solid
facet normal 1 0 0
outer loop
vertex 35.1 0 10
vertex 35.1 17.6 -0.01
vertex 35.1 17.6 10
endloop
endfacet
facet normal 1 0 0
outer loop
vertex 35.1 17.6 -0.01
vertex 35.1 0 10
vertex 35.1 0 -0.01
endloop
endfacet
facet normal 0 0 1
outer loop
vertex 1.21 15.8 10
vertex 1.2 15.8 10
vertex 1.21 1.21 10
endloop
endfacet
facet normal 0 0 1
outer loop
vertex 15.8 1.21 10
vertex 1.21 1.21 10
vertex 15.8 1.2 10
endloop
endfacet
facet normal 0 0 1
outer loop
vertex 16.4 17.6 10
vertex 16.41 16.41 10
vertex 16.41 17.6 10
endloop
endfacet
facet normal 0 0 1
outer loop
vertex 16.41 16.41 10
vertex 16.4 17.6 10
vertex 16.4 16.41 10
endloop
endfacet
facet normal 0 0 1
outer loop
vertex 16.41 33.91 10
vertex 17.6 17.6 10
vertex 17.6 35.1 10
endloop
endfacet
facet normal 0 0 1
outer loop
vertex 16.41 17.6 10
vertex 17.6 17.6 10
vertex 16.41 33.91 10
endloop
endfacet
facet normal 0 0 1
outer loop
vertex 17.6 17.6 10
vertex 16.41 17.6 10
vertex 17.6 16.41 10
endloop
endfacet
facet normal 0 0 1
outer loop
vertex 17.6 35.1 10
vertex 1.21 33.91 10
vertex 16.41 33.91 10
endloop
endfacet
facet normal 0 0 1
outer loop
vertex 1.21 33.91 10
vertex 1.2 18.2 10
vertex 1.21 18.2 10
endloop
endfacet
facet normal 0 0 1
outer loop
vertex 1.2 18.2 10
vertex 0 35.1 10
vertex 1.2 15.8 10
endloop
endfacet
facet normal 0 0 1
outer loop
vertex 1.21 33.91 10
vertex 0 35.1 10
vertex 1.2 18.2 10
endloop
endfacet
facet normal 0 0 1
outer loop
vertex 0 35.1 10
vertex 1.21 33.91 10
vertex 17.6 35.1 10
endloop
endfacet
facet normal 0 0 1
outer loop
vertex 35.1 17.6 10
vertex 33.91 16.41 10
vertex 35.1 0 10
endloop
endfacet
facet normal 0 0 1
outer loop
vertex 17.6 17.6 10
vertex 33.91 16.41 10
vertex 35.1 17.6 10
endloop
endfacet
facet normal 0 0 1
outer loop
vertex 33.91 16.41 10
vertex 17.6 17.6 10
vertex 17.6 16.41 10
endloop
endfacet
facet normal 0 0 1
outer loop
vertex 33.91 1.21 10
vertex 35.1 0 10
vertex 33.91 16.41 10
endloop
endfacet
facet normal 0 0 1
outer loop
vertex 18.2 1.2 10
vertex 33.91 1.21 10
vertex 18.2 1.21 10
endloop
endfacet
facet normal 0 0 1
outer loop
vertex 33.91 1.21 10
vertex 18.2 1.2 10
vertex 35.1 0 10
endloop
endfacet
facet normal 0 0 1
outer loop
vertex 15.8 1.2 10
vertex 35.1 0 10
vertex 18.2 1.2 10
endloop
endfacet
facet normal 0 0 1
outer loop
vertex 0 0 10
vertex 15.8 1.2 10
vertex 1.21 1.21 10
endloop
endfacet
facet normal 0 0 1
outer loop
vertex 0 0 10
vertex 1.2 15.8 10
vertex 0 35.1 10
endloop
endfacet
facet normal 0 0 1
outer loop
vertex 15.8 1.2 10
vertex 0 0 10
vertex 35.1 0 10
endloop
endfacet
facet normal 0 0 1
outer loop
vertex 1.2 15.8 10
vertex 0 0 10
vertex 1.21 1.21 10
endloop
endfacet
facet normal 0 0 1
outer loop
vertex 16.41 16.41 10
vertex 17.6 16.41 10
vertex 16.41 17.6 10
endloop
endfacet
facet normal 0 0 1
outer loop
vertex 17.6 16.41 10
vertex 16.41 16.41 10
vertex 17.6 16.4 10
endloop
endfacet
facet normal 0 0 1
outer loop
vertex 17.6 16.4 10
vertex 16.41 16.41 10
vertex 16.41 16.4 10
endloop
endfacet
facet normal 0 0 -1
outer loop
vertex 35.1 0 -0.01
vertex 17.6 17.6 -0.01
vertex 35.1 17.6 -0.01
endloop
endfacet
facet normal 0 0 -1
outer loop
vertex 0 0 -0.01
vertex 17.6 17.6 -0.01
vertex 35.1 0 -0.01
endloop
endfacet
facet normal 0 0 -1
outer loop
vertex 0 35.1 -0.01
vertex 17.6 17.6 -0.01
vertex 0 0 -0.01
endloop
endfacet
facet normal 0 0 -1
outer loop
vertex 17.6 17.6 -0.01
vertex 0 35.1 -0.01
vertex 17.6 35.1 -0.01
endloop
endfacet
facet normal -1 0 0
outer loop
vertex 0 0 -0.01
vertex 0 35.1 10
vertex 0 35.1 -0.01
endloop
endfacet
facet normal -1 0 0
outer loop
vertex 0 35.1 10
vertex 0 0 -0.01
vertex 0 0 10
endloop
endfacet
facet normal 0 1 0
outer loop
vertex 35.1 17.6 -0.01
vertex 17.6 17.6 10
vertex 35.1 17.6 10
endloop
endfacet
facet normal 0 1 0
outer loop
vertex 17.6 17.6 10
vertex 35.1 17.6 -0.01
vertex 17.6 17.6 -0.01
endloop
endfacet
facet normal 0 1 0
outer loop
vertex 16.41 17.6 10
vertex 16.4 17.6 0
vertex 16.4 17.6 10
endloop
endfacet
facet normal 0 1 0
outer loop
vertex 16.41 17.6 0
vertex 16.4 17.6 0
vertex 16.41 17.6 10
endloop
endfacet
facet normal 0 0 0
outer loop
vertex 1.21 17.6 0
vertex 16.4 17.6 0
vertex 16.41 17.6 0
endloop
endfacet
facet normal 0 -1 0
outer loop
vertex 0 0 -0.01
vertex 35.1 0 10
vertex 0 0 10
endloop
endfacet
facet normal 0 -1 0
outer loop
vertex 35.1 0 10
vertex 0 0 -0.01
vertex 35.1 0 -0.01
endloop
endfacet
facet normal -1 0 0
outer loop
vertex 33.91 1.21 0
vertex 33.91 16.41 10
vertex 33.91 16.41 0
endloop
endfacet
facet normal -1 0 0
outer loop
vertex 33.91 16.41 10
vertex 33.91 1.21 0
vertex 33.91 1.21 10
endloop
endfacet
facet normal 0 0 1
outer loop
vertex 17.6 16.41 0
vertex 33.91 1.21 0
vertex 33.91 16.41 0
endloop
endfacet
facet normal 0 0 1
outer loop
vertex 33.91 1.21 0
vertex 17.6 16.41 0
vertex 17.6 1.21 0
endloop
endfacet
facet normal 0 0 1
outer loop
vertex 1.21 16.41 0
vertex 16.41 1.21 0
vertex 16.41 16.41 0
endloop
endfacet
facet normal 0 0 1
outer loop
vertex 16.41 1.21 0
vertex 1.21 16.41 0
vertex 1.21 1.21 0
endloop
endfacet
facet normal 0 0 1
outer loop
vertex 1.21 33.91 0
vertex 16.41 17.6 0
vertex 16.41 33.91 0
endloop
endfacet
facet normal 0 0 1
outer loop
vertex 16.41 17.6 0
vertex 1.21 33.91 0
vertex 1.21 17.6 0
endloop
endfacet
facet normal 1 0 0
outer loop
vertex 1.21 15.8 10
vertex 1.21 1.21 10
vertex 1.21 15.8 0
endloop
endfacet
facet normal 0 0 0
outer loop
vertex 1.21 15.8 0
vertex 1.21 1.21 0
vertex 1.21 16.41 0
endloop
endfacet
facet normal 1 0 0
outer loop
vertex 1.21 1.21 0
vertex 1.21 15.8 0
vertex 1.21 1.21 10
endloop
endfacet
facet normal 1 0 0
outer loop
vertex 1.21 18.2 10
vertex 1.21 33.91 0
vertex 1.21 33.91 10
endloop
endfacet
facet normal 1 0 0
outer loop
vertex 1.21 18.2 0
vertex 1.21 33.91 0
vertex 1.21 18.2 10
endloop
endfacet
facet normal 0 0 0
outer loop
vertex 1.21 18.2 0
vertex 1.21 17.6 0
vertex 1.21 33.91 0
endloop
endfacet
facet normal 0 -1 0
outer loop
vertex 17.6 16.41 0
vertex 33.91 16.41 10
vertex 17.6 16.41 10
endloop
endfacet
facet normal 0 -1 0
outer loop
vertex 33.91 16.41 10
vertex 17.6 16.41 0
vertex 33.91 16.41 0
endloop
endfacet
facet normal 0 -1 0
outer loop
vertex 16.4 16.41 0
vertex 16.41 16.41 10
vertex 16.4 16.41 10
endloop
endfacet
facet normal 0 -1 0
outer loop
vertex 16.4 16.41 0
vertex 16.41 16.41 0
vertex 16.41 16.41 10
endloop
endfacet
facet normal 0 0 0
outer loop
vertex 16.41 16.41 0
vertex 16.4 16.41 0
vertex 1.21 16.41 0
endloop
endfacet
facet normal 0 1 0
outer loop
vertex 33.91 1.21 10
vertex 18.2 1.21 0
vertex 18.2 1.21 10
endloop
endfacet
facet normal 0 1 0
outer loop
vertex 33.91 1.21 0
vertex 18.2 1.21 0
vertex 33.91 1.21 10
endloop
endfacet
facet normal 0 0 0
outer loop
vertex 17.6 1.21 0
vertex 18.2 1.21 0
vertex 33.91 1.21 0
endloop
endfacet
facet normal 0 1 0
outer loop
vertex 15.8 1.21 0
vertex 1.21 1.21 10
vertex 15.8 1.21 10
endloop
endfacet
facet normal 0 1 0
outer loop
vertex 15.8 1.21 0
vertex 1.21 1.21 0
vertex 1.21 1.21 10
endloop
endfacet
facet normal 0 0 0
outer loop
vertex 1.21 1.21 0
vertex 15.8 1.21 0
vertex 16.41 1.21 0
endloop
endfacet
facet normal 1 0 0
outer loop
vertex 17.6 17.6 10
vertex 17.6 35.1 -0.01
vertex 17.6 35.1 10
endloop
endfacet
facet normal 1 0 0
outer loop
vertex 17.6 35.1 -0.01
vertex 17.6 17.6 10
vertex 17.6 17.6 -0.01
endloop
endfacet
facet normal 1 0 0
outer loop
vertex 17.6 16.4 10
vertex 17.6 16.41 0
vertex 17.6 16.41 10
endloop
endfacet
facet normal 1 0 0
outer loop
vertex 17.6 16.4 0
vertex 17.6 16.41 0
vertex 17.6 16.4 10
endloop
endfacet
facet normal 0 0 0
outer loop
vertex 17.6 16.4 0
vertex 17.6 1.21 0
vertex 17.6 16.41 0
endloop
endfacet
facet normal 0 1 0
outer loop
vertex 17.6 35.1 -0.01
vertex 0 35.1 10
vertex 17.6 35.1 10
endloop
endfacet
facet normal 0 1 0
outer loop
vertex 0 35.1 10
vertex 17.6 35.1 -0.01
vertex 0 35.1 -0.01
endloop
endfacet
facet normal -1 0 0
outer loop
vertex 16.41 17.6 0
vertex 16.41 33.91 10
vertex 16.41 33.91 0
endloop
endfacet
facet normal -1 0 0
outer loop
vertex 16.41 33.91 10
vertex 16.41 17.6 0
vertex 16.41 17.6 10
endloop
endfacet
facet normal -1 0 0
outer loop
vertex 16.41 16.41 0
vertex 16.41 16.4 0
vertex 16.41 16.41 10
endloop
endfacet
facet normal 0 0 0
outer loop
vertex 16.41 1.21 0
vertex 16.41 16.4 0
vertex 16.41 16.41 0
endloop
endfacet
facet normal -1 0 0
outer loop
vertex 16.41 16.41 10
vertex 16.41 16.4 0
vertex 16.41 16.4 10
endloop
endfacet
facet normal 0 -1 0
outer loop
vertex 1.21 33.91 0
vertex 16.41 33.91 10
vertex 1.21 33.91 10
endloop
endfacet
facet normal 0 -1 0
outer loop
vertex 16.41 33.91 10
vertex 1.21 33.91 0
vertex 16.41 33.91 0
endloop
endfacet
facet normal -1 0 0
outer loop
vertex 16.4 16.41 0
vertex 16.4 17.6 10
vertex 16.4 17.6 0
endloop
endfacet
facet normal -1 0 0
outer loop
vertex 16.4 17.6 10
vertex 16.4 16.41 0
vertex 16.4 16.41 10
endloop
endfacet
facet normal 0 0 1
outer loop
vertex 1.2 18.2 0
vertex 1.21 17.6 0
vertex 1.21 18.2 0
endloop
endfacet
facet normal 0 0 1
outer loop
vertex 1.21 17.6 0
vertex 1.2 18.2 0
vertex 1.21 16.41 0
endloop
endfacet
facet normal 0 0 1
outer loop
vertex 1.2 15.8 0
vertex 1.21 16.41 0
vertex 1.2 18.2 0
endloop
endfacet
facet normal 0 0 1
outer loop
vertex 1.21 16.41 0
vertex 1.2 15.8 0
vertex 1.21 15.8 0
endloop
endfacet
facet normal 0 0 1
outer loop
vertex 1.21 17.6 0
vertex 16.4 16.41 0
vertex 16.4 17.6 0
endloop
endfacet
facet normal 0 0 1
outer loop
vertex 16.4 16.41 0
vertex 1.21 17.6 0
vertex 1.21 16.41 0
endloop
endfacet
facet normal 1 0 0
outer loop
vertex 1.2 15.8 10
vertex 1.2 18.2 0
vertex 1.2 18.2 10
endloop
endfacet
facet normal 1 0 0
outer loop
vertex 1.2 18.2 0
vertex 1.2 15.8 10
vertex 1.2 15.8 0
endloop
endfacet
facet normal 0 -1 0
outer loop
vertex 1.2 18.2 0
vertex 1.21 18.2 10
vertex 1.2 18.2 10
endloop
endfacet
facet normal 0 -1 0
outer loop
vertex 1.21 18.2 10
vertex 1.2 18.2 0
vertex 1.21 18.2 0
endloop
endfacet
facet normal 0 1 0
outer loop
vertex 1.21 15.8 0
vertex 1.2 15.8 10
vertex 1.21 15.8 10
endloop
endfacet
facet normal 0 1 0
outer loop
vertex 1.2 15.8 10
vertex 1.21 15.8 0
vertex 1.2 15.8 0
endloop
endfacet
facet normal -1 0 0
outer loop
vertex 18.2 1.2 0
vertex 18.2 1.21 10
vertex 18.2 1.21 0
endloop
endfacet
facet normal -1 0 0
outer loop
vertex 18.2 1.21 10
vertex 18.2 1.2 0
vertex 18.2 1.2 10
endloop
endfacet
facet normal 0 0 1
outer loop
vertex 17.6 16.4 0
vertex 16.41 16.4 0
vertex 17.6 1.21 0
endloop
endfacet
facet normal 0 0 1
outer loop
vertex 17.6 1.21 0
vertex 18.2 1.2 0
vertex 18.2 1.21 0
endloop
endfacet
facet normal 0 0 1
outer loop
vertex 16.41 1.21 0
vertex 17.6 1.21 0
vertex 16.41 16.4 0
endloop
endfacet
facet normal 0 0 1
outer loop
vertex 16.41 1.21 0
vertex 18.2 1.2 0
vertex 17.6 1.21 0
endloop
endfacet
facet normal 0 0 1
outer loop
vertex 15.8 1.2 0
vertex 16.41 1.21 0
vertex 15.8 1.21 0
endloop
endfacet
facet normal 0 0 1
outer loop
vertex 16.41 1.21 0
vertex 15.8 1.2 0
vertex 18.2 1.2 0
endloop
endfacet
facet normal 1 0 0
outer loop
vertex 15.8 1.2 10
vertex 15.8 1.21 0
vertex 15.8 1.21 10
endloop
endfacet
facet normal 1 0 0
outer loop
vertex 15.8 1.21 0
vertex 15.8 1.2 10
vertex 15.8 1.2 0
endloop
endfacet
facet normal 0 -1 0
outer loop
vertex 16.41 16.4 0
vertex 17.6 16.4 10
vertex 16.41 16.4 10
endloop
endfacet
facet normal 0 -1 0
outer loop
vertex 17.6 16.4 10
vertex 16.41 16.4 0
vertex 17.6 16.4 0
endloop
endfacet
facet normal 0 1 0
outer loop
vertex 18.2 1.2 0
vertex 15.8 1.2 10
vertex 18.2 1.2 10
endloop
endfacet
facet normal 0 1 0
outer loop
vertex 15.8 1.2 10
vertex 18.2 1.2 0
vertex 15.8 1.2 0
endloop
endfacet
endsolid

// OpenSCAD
// file: ../Base/Rotation.scad
// Fischertechnik Box Foundation
// Geometry Helpers Rotation

include <PlacementOptions.scad>

// getRotatedSpace(space, rotation=NoRotation)
// Rotates the space dependent on the specified rotation

function getRotatedSpace(space, rotation=NoRotation) = [
    (rotation == Rotate90 || rotation == Rotate270) ? space.y : space.x,
    (rotation == Rotate90 || rotation == Rotate270) ? space.x : space.y
];

// Rotates the given space around the fixed left lower corner
// space = the space the children needs as width/depth list [width,depth]
// rotation = 0 Rotate0 degrees, 1 Rotate90 degrees, 2 Rotate180 degrees, 3 Rotate270 degrees (equivalent to -90)

module RotateFix(space, rotation=NoRotation) {
    dy = (rotation == Rotate0 || rotation == Rotate270) ? 0 :
        (rotation == Rotate90) ? space.x :
        space.y;
    dx = (rotation < Rotate180) ? 0 :
        (rotation == Rotate180) ? space.x :
        space.y;
    
    translate([dx, dy, 0])
        rotate([0, 0, rotations[rotation]])
            children();
}
// file: ../Base/Alignment.scad
// Fischertechnik Box Foundation
// Geometry Helpers Alignment

include <PlacementOptions.scad>

// getAlignedX(elementWidth, spaceWidth, align=AlignRight, offset=0)
// Gets the aligned X offset of an element with the given
// width in the given space.
// elementWidth = The width of the element to positon
// spaceWidth = The space where the element should be aligned
// align = 0 AlignLeft, 1 AlignCenter, 2 AlignRight
// offset = an optional offset from the aligned position. When
// aligned left or centered, then positive values are in X direction.
// When aligned right then positive values are in negative X direction.

function getAlignedX(elementWidth, spaceWidth, align=AlignRight, offset=0) =
    (align == AlignLeft) ?
        offset :
        ((align == AlignCenter) ?
        (spaceWidth - elementWidth)/2 + offset :
        spaceWidth - offset - elementWidth);

// getAlignedY(elementDepth, spaceDepth, align=AlignTop, offset=0)
// Gets the aligned Y offset of an element with the given
// depth in the given space.
// elementDepth = The depth of the element to positon
// spaceDepth = The space where the element should be aligned
// align = 0 AlignBottom, 1 AlignCenter, 2 AlignTop
// offset = an optional offset from the aligned position. When
// aligned bottom or centered, then positive values are in Y direction.
// When aligned top then positive values are in negative Y direction.

function getAlignedY(elementDepth, spaceDepth, align=AlignTop, offset=0) =
    (align == AlignBottom) ?
        offset :
        ((align == AlignCenter) ?
        (spaceDepth - elementDepth)/2 + offset :
        spaceDepth - offset - elementDepth);
// file: ../Base/PlacementOptions.scad
// Fischertechnik Box Foundation
// Placement Options

// Alignment
NoAlign = 0;
AlignLeft = 1;
AlignBottom = 2;
AlignCenter = 3;
AlignRight = 4;
AlignTop = 5;

// Element rotation degree steps
rotations = [0, -90, -180, -270];

// Rotation
NoRotation = 0;
Rotate0 = 0;
Rotate90 = 1;
Rotate180 = 2;
Rotate270 = 3;

// Docking (seen from above)
NoDock = -1;
DockLeft = 0;
DockTop = 1;
DockRight = 2;
DockCorner = 2;
DockBottom = 3;

// Web corners
LowerLeft = 0;
UpperLeft = 1;
UpperRight = 2;
LowerRight = 3;

// Web position relative to corner
LeftOfCorner = 0;
RightOfCorner = 1;
// file: ../Base/Boxes.scad
// Fischertechnik Box Foundation
// Pre-designed Boxes

use <Constants.scad>

include <PlacementOptions.scad>

box190Width = 190;
box190Depth = 130;
box130Width = 130;
box130Depth = 95;

// Values are from an original ec3 box
topBottomDifference = 1.5;
outerHeight = 40;
baseThickness = 1.8;
innerHeight = outerHeight - baseThickness;
stackExcess = 5.7;
radius = 3.5;
wallThickness = 1.5;
tolerance = 0.2;

boxWallThickness = wallThickness;
boxBaseThickness = baseThickness;
boxWebWidth = 3.0;

// getBoxWallThickness()
// Gets the wall thickness of a Fischertechnik Box
function getBoxWallThickness() = boxWallThickness;

// getBoxUsageHeight(height = 38.2)
// Gets the usable height of a Fischertechnik box
// height = Outer height of the box from the bottom to the upper edge.
function getBoxUsageHeight(height = outerHeight) = height - baseThickness - stackExcess;

// getBoxInnerHeight()
// Gets the inner height of a Fischertechnik box, including the stack excess
function getBoxInnerHeight() = innerHeight;

// getBoxBaseThickness()
// Gets the thickness of the Fischertechnik box base.
function getBoxBaseThickness() = boxBaseThickness;

// getBoxWebWidth()
// Gets the width of a box web
function getBoxWebWidth() = boxWebWidth;

// getBox190Space()
// Gets the usable inner space of a Box 190 as an x/y-list
function getBox190Space() = [
    box190Width - 2*getBoxWallThickness() - topBottomDifference, 
    box190Depth - 2*getBoxWallThickness() - topBottomDifference ];

// RoundedCornerPlate(width, depth, height, radius)
// Creates a body plate with rounded corners for a box. Used
// also to create the complete box with the hull module.
// width = Width of the plate
// depth = depth of the plate 
// height = thickness of the plate
// radius = radius of the rounded corner
module RoundedCornerPlate(width, depth, height, radius) {
    translate([radius, radius])
    hull() {
        w = width-2*radius;
        d = depth-2*radius;
        cube([w, d, height]);
        cylinder(height, r=radius, $fn=getFragments());
        translate([w, 0])
            cylinder(height, r=radius, $fn=getFragments());
        translate([w, d])
            cylinder(height, r=radius, $fn=getFragments());
        translate([0, d])
            cylinder(height, r=radius, $fn=getFragments());
    }
}

// BoxBase(width, depth)
// Creates an empty stackable Fischertechnik compatible box
// width = Outer width of the box (190, 130, ...)
// depth = Outer depth of the box (130, 95, ...)

module BoxBase(width, depth, height=outerHeight) {    
    thinPlate = 0.01;

    innerHeight = height - baseThickness;    
    
    module Body(tolerance=tolerance) {
        hull() {
            // Bottom with tolerance to fit into the original boxes when stacked
            translate([-wallThickness+tolerance, -wallThickness+tolerance, -baseThickness])
                RoundedCornerPlate(width-topBottomDifference-2*tolerance, depth-topBottomDifference-2*tolerance, thinPlate, radius);
            
            // Top
            translate([-wallThickness-topBottomDifference/2, -wallThickness-topBottomDifference/2, innerHeight-thinPlate])
                RoundedCornerPlate(width, depth, thinPlate, radius);
         }
    }

    module Cutoff() {
        hull() {
            coWidth = width - 2*wallThickness;
            coDepth = depth - 2*wallThickness;
            
            // Bottom
            RoundedCornerPlate(coWidth-topBottomDifference, coDepth-topBottomDifference, thinPlate, radius);

            // Top
            translate([-topBottomDifference/2, -topBottomDifference/2, innerHeight+thinPlate]) 
                RoundedCornerPlate(coWidth, coDepth, thinPlate, radius);
        }
    }
    
    difference() {        
        Body();
        Cutoff();
        stackOffset = innerHeight - stackExcess;
        translate([0, 0, stackOffset + baseThickness])
            Body(tolerance=0);
    }
}

// Creates the Fischertechnik empty box 130x190 mm and places it at position 0,0
// 190x130 are the outer sizes, the inner space is slightly smaller. Use getBox190Space() to get the inner sizes.
// The box is positioned that the usable inner space is at the 0,0,0 position.

module Box190() {
    BoxBase(box190Width, box190Depth);
}

// Gets the usable inner space of a Box 130 as an x/y-list
function getBox130Space() = [
    box130Width - 2*getBoxWallThickness() - topBottomDifference, 
    box130Depth - 2*getBoxWallThickness() - topBottomDifference ];

// Creates the Fischertechnik empty box 95x130 mm and places it at position 0,0
// 190x130 are the outer sizes, the inner space is slightly smaller. Use getBox190Space() to get the inner sizes.
// The box is positioned that the usable inner space is at the 0,0,0 position.

module Box130() {
    BoxBase(box130Width, box130Depth);
}

// Creates a web at the specified box walls
// corner 0 = LowerLeft, 1 = UpperLeft, 2 = UpperRight, 3 = LowerRight
// side 0 = LeftOfCorner, 1 = RightOfCorner
// distance = Distance in mm from the corner
// boxSpace = inner width and depth of the box (default: Box 190)
// webWidth = length of the web (default is 3 mms)
// webThickness = thickness of the web (default is 1 mm)
// height = Height of the web (standard is getBoxUsageHeight())
// sink = How much of the web is sunk into the wall

module BoxWeb(
    corner, 
    side, 
    distance, 
    boxSpace=getBox190Space(), 
    webWidth=getBoxWebWidth(), 
    webThickness=1.0, 
    height=getBoxUsageHeight(),
    sink = getBoxWallThickness()/2) {
    width = (corner % 2 == 0) ? 
            (side == LeftOfCorner ? webWidth : webThickness) :
            (side == LeftOfCorner ? webThickness : webWidth);

    depth = (corner % 2 == 0) ? 
            (side == RightOfCorner ? webWidth : webThickness) :
            (side == RightOfCorner ? webThickness : webWidth);
    
    xDiff = corner == LowerLeft ? 
                (side == LeftOfCorner ? -sink : distance) :
            (corner == UpperLeft ?                
                (side == LeftOfCorner ? distance : -sink) :
            (corner == UpperRight ?
                (side == LeftOfCorner ? boxSpace.x-webWidth+sink : boxSpace.x-distance-webThickness) :
                (side == LeftOfCorner ? boxSpace.x-distance-webThickness: boxSpace.x-webWidth+sink)));

    yDiff = corner == LowerLeft ? 
                (side == RightOfCorner ? -sink : distance) :
            (corner == UpperLeft ?
                (side == RightOfCorner ? boxSpace.y-distance-webThickness : boxSpace.y-webWidth+sink) :
            (corner == UpperRight ?
                (side == RightOfCorner ? boxSpace.y-webWidth+sink : boxSpace.y-distance-webThickness) :
                (side == RightOfCorner ? distance : -sink)));
    
    translate([xDiff, yDiff, -getExcess()])
        cube([width, depth, height + 2*getExcess()]);
}
// file: ../Base/Placement.scad
// Fischertechnik Box Foundation
// Geometry Helpers Placement

use <Constants.scad>
use <Alignment.scad>
use <Rotation.scad>
use <Boxes.scad>

include <PlacementOptions.scad>

// Place(x=0, y=0, elementSpace=[0,0], alignX=AlignLeft, alignY=AlignBottom, rotation=Rotate0, boxSpace=getBox190Space())
// Places the child at the specified position
// y = Y-Position. This is a relative position when an X aligment is specified.
// x = X-Position. This is a relative position when an Y aligment is specified.
// elementSpace = space of the element to be placed [x,y]
// alignX = -1=NoAlign, 0 AlignLeft, 1 AlignCenter, 3 AlignRight (elementSpace and boxSpace required!)
// alignY = -1=NoAlign, 2 AlignBottom, 1 AlignCenter, 4 AlignTop (elementSpace and boxSpace required!)
// rotation = 0 Rotate0 0 degrees, 1 Rotate90 90 degrees, 
// 2 Rotate180 180 degrees, 3 Rotate270 270 degrees (equivalent to -90)
// boxSpace = Inner space of the box where the placement occurs [x,y] - default is Box 190x130 inner space

module Place(x=0, y=0, elementSpace=[0,0], 
  alignX=AlignLeft, alignY=AlignBottom, 
  rotation=NoRotation, boxSpace=getBox190Space()) {

    module Position(x, y, space, rotation=Rotate0) {
        translate([x, y, 0])
            RotateFix(space, rotation)
                children();
    }

    space = getRotatedSpace(elementSpace, rotation);
    alignedX = getAlignedX(space.x, boxSpace.x, alignX, x);
    alignedY = getAlignedY(space.y, boxSpace.y, alignY, y);
    Position(alignedX, alignedY, elementSpace, rotation)
        children();
}

// Center(space=getBox130Space(), elementSpace=[0,0])
// space = Space where the children is centered. For cylinder use centered=true and no elementSpace.
// elementSpace = space of the element to be centered [x,y]

module Center(space=getBox190Space(), elementSpace=[0,0]) {
    Place(elementSpace=elementSpace, boxSpace=space, alignX=AlignCenter, alignY=AlignCenter)
        children();
}

// CenterHorizontal(width=0, y=0, offset=0, space=getBox130Space())
// width = Width of the element to be placed.
// y = Y position of the element
// offset = Offset from the center position (negative will be left of the center)
// space = Space where the element is placed

module CenterHorizontal(width=0, y=0, offset=0, space=getBox190Space()) {
    Place(x=offset, y=y, elementSpace=[width, 0], boxSpace=space, alignX=AlignCenter)
        children(0);
}

// CenterVertical(depth=0, x=0, offset=0, space=getBox130Space())
// depth = Depth of the element to be placed.
// x = X position of the element
// offset = Offset from the center position (negative will be down of the center)
// space = Space where the element is placed

module CenterVertical(depth=0, x=0, offset=0, space=getBox190Space()) {
    Place(x=x, y=offset, elementSpace=[0, depth], boxSpace=space, alignY=AlignCenter)
        children(0);
}

// getIsVertical(align)
// True if the specified alignment needs a vertical orientation for a divider (AlignRight, AlignLeft)

function getIsVertical(align) = (align == AlignRight || align == AlignLeft);

// getIsHorizontal(align)
// True if the specified alignment needs a horizontal orientation for a divider (AlignTop, AlignBottom)

function getIsHorizontal(align) = (align == AlignTop || align == AlignBottom);
// file: ../Base/Constants.scad
// Fischertechnik Box Foundation
// Constants

// Constant values necessary for multiple elements

// Base constants
dividerThickness = 1.2;
excess = 0.01;
fragments = 90;
tolerance = 0.8;

// Gets the thickness of a divider 
function getDividerThickness() = dividerThickness;

// Gets the excess that is used to merge walls into each other
function getExcess() = excess;

// Gets amount of fragments of a cylinder
function getFragments() = fragments;

// Gets the inner tolerance of a frame to each side
function getTolerance() = tolerance;


// Fischertechnik specific constants
axisDiameter = 4;
axisBottomDiameter = axisDiameter + 1;
axisTolerance = 0.2;

// Gets axis diameter of Fischertechnik axis
function getAxisDiameter() = axisDiameter;

// Gets axis diameter tolerance (subtracted for element axis)
function getAxisTolerance() = axisTolerance;

// Gets the axis diameter for standing axis
function getStandAxisDiameter() = getAxisDiameter() - getAxisTolerance();

// Gets axis bottom diameter for thicker part at the bottom
function getAxisBottomDiameter() = axisBottomDiameter;

pinHeight = 2.5;

// gets the height of a connecting pin
function getPinHeight() = pinHeight;

standardEdgeDistance = 2.5;
standardWebDistance = 11.5;
standardCornerLength = 15;

// gets the standard distance to the wall of the box for dockable frames with webs
function getStandardEdgeDistance() = standardEdgeDistance;

// gets the standard distance of each web to the corner of the dockable frame
function getStandardWebDistance() = standardWebDistance;

// gets the standard length of the corner walls of a dockable frame
function getStandardCornerLength() = standardCornerLength;

tubeWallFactor = 0.8;

// gets the wall thickness of a tube.
function getTubeWallThickness() = tubeWallFactor * getDividerThickness();

smallPartsFrameHeight = 20;

// gets the frame height for docked small parts boxes.
function getSmallPartsFrameHeight() = smallPartsFrameHeight;

hubRingDiameter = 19.5;
hubRingLevelDiameter = 21;

// gets the diameter of a tube matching the inner ring of a wheel
function getHubRingDiameter() = hubRingDiameter;

// gets the diameter of a hub tube with a thicker diameter
function getHubRingLevelDiameter() = hubRingLevelDiameter;
// main file
// Fischertechnik Box Library
// Frame for joint block
// 31008, 31009, 31308, 35831, 36223, 172804, 172805

use <../ModelBase/Simple.scad>

/* [Hidden] */
width = 32.5;
depth = 15;
height = 10;
tolerance = 0.2;

// getFrameJointBlockSpace()
// Gets the complete space of the joint block frame

function getFrameJointBlockSpace() = getAngledFrameOuterVolume(width, depth, width, depth, height, tolerance = tolerance);

// FrameJointBlock()
// Frame for a joint block

module FrameJointBlock() {
    AngledFrame(width, depth, width, depth, height, tolerance=tolerance);
}

// Test
color("lightgray")
FrameJointBlock();
